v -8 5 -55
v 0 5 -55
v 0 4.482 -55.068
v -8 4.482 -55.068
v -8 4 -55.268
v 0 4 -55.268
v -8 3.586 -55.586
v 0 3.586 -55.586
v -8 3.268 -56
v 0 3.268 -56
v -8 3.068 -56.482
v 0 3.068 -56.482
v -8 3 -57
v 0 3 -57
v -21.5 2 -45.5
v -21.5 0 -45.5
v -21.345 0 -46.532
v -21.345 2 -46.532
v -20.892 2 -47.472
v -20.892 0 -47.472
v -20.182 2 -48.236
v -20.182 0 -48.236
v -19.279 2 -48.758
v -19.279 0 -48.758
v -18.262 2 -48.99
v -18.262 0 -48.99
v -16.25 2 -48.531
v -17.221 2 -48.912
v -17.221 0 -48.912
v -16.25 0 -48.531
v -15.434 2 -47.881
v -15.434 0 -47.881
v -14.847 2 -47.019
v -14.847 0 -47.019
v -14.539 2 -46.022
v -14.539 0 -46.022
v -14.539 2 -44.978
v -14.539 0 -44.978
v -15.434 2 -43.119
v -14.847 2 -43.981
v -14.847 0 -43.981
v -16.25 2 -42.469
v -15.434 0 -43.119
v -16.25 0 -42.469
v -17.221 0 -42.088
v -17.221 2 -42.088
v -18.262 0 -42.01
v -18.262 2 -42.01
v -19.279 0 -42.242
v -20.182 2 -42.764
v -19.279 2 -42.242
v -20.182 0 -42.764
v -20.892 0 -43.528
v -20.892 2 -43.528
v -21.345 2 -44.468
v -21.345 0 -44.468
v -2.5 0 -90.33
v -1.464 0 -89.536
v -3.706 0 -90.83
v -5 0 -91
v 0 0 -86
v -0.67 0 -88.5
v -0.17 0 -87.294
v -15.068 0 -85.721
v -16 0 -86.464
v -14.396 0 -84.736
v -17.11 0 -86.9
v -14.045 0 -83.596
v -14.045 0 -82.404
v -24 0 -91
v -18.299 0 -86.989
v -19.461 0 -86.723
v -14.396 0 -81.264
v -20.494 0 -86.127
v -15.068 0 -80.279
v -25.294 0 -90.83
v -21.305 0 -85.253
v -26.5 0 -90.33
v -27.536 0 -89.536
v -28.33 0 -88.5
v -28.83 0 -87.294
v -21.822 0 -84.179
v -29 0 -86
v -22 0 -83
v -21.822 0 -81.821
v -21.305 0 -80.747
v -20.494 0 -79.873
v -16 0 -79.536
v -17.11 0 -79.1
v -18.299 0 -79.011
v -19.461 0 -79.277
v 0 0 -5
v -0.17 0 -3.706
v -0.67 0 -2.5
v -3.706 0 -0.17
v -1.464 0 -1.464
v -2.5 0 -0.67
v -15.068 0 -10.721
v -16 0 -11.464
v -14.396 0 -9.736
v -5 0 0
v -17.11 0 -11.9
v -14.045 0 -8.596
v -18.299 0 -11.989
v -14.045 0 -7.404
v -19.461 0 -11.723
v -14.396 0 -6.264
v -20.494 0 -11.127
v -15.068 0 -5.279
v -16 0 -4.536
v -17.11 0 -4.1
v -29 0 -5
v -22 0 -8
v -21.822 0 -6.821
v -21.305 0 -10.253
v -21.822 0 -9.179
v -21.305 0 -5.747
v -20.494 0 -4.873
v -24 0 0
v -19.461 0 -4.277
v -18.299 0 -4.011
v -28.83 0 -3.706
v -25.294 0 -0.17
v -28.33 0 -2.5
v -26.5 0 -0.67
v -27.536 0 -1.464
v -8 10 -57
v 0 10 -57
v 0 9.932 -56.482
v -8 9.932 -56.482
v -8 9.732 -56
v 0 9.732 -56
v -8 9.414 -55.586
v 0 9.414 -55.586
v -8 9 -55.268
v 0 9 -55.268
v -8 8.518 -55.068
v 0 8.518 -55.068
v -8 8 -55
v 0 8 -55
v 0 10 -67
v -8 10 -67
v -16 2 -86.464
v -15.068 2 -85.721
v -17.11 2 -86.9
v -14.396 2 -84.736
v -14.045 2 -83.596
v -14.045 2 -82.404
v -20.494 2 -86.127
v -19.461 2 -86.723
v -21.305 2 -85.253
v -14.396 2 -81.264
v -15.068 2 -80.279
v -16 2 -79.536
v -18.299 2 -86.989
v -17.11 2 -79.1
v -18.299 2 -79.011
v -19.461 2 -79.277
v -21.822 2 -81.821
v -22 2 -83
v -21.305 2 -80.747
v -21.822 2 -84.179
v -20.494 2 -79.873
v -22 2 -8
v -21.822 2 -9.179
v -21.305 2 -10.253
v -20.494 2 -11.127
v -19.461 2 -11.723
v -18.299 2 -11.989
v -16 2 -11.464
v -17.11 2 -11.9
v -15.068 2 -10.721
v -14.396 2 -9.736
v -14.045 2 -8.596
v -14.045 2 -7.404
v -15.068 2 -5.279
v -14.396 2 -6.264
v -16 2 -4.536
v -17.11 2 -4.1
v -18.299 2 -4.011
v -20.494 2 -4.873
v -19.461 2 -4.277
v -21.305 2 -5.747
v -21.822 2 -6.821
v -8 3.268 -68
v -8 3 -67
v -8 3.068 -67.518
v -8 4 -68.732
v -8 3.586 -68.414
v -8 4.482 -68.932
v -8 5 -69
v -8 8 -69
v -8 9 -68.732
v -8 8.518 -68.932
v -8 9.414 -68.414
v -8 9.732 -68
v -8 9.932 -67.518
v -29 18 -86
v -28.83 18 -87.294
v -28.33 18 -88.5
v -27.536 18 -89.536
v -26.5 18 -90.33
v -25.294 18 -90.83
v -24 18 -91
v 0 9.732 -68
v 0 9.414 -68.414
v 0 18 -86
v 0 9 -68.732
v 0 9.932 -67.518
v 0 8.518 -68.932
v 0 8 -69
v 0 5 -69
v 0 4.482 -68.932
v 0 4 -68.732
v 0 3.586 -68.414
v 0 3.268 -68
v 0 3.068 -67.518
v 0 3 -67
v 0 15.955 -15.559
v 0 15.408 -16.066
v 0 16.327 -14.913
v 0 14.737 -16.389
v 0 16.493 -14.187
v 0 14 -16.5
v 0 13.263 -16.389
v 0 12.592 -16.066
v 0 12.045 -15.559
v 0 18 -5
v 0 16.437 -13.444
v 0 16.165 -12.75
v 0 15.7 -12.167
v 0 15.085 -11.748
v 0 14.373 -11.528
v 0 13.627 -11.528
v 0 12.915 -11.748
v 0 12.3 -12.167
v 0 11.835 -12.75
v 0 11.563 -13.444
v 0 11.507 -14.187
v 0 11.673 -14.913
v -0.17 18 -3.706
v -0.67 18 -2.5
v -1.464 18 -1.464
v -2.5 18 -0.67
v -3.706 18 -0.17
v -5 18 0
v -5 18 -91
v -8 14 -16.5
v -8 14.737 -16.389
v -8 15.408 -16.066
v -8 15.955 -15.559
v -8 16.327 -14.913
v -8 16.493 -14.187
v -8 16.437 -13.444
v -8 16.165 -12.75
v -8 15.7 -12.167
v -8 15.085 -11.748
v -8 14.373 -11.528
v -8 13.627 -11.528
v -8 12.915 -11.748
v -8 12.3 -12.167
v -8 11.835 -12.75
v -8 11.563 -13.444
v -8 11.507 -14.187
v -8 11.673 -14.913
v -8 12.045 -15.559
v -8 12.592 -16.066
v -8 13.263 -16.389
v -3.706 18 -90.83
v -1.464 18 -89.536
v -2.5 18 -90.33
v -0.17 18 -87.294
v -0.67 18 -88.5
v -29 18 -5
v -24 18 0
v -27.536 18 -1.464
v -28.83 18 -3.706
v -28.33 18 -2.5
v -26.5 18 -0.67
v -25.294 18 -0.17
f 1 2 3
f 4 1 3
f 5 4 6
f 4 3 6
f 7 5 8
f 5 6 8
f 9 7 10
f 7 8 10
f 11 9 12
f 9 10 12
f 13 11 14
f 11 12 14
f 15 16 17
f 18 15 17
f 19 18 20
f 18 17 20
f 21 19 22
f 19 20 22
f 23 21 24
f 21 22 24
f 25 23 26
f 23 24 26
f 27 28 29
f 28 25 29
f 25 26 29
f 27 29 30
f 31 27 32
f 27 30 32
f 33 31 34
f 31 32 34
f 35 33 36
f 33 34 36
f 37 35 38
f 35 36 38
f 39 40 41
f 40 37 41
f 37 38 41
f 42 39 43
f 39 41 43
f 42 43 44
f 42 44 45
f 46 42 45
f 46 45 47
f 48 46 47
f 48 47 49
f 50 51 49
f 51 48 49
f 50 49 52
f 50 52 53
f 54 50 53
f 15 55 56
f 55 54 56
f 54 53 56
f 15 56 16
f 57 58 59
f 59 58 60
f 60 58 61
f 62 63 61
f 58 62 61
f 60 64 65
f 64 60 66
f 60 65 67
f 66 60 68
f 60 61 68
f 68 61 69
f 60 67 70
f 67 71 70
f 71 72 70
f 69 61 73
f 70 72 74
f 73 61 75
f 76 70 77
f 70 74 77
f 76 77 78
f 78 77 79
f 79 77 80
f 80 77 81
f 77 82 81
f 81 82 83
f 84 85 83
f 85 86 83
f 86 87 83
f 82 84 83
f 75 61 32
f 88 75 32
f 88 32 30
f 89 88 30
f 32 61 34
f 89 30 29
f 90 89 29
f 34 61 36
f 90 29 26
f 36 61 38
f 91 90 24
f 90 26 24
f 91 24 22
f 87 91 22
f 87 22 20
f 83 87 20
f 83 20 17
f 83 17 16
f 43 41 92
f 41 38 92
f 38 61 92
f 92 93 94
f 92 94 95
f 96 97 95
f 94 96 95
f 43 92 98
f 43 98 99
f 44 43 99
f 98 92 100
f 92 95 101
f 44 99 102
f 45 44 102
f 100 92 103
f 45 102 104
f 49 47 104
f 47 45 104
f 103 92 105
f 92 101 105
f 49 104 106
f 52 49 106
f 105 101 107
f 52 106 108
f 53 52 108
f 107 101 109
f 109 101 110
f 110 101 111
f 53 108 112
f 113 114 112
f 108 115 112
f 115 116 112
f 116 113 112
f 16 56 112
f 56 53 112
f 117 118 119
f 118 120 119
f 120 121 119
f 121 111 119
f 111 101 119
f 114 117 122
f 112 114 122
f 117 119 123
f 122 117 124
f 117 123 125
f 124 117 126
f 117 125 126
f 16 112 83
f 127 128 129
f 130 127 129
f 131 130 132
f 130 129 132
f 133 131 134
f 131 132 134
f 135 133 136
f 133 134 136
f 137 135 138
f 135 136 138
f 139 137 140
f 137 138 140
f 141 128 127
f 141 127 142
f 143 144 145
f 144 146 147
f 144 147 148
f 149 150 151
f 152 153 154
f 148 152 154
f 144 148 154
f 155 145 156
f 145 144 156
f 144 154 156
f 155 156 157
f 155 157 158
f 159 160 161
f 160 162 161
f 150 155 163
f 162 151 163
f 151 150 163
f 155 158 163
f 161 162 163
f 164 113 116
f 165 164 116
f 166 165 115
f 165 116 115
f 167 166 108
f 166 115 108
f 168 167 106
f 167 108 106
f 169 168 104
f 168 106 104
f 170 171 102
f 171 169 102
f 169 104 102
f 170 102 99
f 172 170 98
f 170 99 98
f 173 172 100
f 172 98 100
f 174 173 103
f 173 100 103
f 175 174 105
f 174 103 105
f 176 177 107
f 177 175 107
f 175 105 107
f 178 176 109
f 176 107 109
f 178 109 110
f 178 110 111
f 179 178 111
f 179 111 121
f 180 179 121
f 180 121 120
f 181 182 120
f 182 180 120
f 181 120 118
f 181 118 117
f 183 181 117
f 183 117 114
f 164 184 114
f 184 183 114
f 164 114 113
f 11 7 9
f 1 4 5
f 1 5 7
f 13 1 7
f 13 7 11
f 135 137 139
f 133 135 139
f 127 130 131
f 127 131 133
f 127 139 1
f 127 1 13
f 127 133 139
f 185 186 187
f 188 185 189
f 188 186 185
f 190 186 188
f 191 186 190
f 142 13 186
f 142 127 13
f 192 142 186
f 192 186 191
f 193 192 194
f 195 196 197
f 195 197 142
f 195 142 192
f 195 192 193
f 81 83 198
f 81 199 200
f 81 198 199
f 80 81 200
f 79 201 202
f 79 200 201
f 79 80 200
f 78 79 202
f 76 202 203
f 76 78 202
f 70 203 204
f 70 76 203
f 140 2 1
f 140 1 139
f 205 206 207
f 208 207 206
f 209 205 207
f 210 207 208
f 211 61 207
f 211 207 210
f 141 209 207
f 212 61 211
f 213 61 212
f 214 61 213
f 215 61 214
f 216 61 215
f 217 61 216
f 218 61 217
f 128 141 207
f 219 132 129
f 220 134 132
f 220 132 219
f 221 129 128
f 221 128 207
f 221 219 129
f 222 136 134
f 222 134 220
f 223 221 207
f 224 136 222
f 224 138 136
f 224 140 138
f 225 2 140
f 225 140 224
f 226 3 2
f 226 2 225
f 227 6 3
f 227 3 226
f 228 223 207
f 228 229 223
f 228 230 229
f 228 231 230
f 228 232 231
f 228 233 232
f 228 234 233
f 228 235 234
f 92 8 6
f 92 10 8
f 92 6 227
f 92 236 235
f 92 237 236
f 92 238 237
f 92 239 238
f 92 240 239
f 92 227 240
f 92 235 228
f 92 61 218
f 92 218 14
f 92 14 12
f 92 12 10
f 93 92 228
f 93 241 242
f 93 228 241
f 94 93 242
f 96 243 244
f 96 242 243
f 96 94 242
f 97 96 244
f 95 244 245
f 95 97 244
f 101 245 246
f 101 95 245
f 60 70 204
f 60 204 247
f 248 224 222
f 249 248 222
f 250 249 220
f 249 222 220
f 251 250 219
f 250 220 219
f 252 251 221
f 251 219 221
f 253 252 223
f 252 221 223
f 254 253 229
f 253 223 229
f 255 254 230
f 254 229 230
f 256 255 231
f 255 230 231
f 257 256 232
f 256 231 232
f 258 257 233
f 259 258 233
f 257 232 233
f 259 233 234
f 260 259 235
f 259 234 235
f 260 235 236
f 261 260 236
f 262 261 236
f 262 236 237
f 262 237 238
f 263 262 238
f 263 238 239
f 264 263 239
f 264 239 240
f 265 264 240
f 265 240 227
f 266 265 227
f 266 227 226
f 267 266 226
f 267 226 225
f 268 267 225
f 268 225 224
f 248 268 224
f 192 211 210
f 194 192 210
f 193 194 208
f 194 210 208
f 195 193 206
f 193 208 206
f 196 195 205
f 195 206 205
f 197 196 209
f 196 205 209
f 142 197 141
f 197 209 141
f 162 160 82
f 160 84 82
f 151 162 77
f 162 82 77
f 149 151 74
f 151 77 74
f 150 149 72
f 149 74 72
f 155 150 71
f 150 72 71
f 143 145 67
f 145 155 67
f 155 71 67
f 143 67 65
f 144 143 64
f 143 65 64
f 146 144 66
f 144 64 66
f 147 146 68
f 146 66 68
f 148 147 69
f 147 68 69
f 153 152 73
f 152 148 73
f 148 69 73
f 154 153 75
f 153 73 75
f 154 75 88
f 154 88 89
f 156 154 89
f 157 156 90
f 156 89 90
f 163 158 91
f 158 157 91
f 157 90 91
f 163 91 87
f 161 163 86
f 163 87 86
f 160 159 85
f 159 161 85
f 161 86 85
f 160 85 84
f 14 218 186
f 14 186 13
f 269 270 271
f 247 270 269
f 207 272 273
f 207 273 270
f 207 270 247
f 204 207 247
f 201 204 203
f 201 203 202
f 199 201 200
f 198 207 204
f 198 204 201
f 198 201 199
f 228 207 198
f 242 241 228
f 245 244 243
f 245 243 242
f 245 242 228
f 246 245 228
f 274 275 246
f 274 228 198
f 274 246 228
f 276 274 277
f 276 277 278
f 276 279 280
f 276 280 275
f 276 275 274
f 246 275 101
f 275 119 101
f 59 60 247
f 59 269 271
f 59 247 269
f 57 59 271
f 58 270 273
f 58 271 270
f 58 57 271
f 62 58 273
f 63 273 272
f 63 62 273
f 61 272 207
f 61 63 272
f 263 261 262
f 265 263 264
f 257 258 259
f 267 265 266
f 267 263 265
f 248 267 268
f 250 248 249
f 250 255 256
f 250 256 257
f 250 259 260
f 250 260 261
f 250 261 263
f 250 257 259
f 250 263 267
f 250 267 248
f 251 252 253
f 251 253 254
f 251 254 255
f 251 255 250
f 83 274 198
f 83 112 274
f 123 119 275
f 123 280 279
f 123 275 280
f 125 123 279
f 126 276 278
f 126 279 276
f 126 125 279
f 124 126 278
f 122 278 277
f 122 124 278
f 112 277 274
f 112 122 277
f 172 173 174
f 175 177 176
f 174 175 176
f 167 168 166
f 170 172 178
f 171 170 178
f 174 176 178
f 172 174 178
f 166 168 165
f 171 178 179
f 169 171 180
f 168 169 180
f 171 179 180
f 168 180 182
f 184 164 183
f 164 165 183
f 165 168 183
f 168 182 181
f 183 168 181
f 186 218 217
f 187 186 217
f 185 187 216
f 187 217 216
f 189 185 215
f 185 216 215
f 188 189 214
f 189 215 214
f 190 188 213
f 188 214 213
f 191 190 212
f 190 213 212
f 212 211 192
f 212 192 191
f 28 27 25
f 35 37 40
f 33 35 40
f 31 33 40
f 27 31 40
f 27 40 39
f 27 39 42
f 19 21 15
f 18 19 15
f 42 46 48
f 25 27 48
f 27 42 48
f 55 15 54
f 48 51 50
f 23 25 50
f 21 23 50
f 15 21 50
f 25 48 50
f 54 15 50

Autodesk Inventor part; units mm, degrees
ref_plane "YZ Plane" through (0, 0, 0) normal (1, 0, 0) x (0, 1, 0)
ref_plane "XZ Plane" through (0, 0, 0) normal (0, 1, 0) x (-1, 0, 0)
ref_plane "XY Plane" through (0, 0, 0) normal (0, 0, 1) x (1, 0, 0)
sketch "Sketch1" plane through (0, 0, 0) normal (0, 1, 0) x (-1, 0, 0)
  line L0 (0, -110.6497) -> (0, 19.6497) projected
  line L1 (36.2497, 0) -> (-7.2497, 0) projected
  line L2 (5, 0) -> (24, 0)
  line L3 (29, -5) -> (29, -86)
  line L4 (24, -91) -> (5, -91)
  line L5 (0, -86) -> (0, -5)
  line L6 (0, 0) -> (29, -91) construction
  line L7 (29, 0) -> (0, -91) construction
  arc A0 (29, -5) -> (24, 0) centre (24, -5) ccw
  arc A1 (24, -91) -> (29, -86) centre (24, -86) ccw
  arc A2 (0, -86) -> (5, -91) centre (5, -86) ccw
  arc A3 (5, 0) -> (0, -5) centre (5, -5) ccw
  circle A4 centre (18, -8) radius 4
  circle A5 centre (18, -45.5) radius 3.5
  circle A6 centre (18, -83) radius 4
  point P0 (0, -5)
  dimension "d0" = 29
  dimension "d1" = 91
  dimension "d2" = 5
  dimension "d3" = 8
  dimension "d4" = 7
  dimension "d5" = 8
  dimension "d6" = 18
  dimension "d7" = 45.5
  dimension "d8" = 18
  dimension "d9" = 8
  dimension "d10" = 8
  dimension "d11" = 18
extrude "Extrusion1" add sketch "Sketch1" along normal blind 18 contours L0 A3 L1 A0 L3 A1 L4 A2 | A4 | A5 | A6
sketch "Sketch2" plane through (0, 0, -5) normal (1, 0, 0) x (0, 0, -1)
  line L0 (-5, -3.6) -> (-5, 21.6) projected
  line L1 (104.2, 0) -> (-23.2, 0) projected
  circle A0 centre (9, 14) radius 2.5
  line L2 (52, 10) -> (62, 10)
  line L3 (64, 8) -> (64, 5)
  line L4 (62, 3) -> (52, 3)
  line L5 (50, 5) -> (50, 8)
  line L6 (50, 10) -> (64, 3) construction
  line L7 (64, 10) -> (50, 3) construction
  arc A1 (64, 8) -> (62, 10) centre (62, 8) ccw
  arc A2 (62, 3) -> (64, 5) centre (62, 5) ccw
  arc A3 (50, 5) -> (52, 3) centre (52, 5) ccw
  arc A4 (52, 10) -> (50, 8) centre (52, 8) ccw
  point P0 (-5, 0)
  point P1 (57, 6.5)
  point P2 (50, 6.5)
  dimension "d14" = 5
  dimension "d15" = 14
  dimension "d16" = 14
  dimension "d17" = 14
  dimension "d18" = 7
  dimension "d19" = 2
  dimension "d20" = 55
  dimension "d21" = 3
extrude "Extrusion2" cut sketch "Sketch1" along normal blind 2 contours A4 | A5 | A6
extrude "Extrusion3" cut sketch "Sketch2" against normal blind 8
properties part number "camera_model"
